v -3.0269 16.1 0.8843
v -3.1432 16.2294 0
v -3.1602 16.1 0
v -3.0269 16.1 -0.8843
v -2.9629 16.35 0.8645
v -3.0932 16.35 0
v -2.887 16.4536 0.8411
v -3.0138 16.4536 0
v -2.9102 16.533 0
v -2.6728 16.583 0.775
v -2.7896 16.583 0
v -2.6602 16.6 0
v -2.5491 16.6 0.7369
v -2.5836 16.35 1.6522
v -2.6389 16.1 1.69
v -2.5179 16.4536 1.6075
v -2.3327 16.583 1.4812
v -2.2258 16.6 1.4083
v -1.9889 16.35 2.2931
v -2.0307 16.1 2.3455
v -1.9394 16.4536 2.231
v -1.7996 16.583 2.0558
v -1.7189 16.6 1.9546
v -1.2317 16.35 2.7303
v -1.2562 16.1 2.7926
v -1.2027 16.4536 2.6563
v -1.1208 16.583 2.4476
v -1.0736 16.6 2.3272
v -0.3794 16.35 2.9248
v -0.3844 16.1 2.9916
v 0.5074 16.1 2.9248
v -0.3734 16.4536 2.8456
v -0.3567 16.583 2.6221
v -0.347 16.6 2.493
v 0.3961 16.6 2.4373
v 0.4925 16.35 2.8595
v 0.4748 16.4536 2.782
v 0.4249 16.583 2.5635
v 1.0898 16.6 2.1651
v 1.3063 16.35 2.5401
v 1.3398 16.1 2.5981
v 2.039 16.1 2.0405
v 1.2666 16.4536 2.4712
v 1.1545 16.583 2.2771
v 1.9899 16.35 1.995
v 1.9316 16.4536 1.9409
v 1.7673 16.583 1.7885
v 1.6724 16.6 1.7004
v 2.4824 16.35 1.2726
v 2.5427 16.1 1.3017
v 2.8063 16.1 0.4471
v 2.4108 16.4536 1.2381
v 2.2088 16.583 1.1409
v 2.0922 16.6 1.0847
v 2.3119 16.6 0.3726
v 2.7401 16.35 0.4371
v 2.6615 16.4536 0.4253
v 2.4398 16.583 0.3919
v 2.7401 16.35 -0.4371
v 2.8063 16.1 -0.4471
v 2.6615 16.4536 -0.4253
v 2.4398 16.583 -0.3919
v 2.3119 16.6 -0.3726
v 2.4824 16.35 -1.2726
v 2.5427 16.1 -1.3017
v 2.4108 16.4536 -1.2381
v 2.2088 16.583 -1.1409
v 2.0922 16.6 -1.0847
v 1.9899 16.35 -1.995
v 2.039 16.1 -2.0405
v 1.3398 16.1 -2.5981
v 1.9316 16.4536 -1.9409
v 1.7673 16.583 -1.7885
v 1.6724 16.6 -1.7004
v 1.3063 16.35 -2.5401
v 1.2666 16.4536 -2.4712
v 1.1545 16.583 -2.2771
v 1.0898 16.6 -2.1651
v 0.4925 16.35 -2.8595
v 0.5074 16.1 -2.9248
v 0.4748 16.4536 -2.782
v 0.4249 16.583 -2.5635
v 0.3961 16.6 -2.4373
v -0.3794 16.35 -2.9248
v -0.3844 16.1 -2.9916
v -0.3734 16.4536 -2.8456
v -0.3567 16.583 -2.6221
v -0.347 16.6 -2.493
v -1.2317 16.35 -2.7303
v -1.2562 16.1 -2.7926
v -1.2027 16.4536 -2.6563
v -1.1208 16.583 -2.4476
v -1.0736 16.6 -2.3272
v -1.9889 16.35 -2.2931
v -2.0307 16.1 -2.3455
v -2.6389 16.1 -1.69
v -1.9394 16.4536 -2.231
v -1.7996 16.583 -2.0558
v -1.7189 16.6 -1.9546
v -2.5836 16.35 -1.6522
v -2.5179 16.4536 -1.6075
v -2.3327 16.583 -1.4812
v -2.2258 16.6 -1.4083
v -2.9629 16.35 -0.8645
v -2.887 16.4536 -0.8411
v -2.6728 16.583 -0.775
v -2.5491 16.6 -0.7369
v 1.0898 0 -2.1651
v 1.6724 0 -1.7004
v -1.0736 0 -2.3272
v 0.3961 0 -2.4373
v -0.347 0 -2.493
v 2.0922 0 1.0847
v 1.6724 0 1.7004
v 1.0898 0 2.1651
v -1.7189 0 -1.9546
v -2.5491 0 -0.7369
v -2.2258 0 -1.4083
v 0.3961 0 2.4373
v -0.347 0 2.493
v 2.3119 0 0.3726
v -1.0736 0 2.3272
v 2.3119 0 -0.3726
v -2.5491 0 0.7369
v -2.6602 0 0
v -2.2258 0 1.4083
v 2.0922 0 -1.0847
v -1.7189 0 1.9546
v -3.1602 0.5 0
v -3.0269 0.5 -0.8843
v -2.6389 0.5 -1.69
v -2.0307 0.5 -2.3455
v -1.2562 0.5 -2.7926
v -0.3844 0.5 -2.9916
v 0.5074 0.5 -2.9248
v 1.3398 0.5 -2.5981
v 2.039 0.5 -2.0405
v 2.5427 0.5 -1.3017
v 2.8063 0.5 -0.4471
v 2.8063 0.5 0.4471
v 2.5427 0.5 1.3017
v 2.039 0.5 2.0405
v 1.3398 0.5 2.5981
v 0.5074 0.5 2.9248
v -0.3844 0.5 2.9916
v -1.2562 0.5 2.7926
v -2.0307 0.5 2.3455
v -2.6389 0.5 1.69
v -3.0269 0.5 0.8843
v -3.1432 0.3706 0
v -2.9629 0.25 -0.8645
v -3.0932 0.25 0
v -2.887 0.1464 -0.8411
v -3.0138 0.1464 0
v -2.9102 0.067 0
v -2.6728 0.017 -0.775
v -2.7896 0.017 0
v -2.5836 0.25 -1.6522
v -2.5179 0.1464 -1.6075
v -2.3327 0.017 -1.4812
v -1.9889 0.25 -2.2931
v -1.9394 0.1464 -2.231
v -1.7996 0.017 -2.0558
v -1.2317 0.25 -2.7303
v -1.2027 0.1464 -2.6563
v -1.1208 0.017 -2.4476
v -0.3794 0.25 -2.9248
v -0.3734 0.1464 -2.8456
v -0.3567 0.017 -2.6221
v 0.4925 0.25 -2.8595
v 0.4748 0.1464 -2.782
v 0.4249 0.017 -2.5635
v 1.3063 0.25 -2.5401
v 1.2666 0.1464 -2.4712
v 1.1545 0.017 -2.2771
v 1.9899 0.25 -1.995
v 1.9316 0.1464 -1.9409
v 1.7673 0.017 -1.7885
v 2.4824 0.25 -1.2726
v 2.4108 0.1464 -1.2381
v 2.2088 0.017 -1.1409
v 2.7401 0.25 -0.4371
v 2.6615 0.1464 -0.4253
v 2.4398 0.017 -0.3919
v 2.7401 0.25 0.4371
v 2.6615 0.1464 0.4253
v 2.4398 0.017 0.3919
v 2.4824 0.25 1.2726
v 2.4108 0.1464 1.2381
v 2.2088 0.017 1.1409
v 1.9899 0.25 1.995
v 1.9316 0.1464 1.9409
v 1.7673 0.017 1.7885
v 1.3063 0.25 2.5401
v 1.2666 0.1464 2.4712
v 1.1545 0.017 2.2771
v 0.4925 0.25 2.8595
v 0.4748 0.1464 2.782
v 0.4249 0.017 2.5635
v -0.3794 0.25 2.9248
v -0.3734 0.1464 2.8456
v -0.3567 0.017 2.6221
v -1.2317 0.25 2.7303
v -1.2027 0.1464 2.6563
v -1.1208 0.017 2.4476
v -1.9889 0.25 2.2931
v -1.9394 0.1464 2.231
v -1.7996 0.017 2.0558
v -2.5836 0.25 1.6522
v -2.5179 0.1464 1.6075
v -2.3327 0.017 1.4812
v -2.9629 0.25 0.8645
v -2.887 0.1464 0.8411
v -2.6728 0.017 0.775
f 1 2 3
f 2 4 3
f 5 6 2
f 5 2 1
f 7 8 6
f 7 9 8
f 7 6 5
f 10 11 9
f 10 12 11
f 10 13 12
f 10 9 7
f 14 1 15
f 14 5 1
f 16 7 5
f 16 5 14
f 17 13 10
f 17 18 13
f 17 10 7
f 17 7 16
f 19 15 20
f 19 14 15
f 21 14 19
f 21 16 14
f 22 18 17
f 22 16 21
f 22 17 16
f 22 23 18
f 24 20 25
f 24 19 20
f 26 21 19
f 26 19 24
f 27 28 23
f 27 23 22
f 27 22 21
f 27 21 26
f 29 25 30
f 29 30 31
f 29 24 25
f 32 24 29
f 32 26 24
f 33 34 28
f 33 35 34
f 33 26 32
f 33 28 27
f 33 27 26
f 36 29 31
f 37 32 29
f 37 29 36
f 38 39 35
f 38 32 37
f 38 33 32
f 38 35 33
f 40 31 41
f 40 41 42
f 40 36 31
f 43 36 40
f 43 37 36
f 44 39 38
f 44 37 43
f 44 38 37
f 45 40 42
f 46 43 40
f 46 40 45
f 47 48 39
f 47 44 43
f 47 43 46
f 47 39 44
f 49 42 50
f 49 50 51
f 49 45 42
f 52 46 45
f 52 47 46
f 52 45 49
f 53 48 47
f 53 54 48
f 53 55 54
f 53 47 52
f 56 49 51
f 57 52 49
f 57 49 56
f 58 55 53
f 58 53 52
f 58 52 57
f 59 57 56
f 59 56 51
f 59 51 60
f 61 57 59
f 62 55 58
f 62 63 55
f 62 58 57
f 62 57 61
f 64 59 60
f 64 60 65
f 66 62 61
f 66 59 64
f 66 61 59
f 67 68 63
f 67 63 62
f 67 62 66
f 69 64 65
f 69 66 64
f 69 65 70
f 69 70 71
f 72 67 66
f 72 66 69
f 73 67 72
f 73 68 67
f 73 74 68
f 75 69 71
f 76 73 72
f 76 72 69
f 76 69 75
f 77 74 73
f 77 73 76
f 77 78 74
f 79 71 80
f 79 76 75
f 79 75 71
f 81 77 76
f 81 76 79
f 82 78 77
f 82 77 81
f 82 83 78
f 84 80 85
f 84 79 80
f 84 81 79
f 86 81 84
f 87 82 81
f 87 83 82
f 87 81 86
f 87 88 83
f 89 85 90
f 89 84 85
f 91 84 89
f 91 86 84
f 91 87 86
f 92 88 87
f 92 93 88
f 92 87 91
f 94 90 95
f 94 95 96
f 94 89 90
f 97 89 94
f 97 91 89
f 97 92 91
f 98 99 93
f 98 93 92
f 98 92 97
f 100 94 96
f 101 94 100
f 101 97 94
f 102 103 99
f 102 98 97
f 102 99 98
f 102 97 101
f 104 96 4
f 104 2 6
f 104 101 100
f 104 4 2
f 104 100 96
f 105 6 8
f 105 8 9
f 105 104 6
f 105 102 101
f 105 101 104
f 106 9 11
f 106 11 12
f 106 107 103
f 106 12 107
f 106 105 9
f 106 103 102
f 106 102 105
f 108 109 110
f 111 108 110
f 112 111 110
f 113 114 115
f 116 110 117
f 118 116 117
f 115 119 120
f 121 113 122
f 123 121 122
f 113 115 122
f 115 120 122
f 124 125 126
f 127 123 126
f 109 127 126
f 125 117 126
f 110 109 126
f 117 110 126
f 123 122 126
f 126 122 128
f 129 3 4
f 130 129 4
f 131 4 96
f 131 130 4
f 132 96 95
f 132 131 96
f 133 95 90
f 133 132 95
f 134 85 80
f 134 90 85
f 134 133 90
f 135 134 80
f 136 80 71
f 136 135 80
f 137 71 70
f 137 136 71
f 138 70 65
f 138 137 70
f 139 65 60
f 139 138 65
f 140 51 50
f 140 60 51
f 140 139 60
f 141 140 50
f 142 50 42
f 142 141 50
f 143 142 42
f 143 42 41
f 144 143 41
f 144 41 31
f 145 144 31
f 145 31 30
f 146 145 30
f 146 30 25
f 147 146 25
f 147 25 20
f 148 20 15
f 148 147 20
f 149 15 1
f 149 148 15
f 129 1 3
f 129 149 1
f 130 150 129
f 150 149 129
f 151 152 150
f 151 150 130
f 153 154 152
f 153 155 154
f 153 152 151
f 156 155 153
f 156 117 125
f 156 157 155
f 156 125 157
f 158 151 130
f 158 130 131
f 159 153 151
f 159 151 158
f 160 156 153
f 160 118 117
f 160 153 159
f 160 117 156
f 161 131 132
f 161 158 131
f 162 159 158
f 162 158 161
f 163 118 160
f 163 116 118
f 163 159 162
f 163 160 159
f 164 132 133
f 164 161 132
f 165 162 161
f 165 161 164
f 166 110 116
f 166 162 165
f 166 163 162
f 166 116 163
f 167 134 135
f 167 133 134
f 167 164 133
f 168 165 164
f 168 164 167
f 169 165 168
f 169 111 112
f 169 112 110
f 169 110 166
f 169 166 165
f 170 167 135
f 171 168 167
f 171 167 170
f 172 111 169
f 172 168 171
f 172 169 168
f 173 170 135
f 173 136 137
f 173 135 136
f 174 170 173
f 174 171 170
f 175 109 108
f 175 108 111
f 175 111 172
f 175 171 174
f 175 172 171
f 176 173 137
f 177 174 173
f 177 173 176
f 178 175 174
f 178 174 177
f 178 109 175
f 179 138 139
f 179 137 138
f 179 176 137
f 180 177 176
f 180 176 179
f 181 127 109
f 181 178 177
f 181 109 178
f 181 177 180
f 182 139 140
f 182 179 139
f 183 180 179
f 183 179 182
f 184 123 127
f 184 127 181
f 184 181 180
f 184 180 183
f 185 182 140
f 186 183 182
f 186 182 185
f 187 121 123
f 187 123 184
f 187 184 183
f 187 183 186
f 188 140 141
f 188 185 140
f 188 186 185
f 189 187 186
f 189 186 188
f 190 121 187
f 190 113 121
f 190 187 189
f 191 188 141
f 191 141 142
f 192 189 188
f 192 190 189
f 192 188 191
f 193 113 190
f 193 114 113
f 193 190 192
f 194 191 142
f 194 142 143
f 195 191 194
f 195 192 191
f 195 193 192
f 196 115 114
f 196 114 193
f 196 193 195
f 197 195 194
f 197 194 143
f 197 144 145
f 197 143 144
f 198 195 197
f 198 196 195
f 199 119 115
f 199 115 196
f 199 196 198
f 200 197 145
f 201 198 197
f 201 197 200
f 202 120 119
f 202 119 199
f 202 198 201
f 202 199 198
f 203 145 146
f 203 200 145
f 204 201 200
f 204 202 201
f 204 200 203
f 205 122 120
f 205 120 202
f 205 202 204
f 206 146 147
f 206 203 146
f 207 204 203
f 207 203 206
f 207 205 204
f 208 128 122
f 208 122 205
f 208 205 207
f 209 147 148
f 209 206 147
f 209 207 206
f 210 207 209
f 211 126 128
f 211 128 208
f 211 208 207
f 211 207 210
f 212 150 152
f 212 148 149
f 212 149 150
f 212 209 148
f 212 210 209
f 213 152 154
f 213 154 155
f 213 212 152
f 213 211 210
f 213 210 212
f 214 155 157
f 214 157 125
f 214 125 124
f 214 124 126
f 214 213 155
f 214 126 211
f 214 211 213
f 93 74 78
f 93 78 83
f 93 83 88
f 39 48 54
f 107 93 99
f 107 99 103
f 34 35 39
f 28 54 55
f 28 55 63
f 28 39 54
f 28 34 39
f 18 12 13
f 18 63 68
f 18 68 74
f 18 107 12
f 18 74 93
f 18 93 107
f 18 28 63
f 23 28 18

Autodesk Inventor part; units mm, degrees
ref_plane "YZ Plane" through (0, 0, 0) normal (1, 0, 0) x (0, 1, 0)
ref_plane "XZ Plane" through (0, 0, 0) normal (0, 1, 0) x (-1, 0, 0)
ref_plane "XY Plane" through (0, 0, 0) normal (0, 0, 1) x (1, 0, 0)
sketch "Sketch1" plane through (0, 0, 0) normal (0, 1, 0) x (-1, 0, 0)
  circle A0 centre (0.1602, 0) radius 3
  point P0 (0, 0)
  dimension "d0" = 6
extrude "Extrusion2" add sketch "Sketch1" along normal blind 16.6
fillet "Fillet1" radius 0.5 1 edges at (2.8398, 16.6, 0)
fillet "Fillet2" radius 0.5 1 edges at (2.8398, 0, 0)
properties part number "connector"
